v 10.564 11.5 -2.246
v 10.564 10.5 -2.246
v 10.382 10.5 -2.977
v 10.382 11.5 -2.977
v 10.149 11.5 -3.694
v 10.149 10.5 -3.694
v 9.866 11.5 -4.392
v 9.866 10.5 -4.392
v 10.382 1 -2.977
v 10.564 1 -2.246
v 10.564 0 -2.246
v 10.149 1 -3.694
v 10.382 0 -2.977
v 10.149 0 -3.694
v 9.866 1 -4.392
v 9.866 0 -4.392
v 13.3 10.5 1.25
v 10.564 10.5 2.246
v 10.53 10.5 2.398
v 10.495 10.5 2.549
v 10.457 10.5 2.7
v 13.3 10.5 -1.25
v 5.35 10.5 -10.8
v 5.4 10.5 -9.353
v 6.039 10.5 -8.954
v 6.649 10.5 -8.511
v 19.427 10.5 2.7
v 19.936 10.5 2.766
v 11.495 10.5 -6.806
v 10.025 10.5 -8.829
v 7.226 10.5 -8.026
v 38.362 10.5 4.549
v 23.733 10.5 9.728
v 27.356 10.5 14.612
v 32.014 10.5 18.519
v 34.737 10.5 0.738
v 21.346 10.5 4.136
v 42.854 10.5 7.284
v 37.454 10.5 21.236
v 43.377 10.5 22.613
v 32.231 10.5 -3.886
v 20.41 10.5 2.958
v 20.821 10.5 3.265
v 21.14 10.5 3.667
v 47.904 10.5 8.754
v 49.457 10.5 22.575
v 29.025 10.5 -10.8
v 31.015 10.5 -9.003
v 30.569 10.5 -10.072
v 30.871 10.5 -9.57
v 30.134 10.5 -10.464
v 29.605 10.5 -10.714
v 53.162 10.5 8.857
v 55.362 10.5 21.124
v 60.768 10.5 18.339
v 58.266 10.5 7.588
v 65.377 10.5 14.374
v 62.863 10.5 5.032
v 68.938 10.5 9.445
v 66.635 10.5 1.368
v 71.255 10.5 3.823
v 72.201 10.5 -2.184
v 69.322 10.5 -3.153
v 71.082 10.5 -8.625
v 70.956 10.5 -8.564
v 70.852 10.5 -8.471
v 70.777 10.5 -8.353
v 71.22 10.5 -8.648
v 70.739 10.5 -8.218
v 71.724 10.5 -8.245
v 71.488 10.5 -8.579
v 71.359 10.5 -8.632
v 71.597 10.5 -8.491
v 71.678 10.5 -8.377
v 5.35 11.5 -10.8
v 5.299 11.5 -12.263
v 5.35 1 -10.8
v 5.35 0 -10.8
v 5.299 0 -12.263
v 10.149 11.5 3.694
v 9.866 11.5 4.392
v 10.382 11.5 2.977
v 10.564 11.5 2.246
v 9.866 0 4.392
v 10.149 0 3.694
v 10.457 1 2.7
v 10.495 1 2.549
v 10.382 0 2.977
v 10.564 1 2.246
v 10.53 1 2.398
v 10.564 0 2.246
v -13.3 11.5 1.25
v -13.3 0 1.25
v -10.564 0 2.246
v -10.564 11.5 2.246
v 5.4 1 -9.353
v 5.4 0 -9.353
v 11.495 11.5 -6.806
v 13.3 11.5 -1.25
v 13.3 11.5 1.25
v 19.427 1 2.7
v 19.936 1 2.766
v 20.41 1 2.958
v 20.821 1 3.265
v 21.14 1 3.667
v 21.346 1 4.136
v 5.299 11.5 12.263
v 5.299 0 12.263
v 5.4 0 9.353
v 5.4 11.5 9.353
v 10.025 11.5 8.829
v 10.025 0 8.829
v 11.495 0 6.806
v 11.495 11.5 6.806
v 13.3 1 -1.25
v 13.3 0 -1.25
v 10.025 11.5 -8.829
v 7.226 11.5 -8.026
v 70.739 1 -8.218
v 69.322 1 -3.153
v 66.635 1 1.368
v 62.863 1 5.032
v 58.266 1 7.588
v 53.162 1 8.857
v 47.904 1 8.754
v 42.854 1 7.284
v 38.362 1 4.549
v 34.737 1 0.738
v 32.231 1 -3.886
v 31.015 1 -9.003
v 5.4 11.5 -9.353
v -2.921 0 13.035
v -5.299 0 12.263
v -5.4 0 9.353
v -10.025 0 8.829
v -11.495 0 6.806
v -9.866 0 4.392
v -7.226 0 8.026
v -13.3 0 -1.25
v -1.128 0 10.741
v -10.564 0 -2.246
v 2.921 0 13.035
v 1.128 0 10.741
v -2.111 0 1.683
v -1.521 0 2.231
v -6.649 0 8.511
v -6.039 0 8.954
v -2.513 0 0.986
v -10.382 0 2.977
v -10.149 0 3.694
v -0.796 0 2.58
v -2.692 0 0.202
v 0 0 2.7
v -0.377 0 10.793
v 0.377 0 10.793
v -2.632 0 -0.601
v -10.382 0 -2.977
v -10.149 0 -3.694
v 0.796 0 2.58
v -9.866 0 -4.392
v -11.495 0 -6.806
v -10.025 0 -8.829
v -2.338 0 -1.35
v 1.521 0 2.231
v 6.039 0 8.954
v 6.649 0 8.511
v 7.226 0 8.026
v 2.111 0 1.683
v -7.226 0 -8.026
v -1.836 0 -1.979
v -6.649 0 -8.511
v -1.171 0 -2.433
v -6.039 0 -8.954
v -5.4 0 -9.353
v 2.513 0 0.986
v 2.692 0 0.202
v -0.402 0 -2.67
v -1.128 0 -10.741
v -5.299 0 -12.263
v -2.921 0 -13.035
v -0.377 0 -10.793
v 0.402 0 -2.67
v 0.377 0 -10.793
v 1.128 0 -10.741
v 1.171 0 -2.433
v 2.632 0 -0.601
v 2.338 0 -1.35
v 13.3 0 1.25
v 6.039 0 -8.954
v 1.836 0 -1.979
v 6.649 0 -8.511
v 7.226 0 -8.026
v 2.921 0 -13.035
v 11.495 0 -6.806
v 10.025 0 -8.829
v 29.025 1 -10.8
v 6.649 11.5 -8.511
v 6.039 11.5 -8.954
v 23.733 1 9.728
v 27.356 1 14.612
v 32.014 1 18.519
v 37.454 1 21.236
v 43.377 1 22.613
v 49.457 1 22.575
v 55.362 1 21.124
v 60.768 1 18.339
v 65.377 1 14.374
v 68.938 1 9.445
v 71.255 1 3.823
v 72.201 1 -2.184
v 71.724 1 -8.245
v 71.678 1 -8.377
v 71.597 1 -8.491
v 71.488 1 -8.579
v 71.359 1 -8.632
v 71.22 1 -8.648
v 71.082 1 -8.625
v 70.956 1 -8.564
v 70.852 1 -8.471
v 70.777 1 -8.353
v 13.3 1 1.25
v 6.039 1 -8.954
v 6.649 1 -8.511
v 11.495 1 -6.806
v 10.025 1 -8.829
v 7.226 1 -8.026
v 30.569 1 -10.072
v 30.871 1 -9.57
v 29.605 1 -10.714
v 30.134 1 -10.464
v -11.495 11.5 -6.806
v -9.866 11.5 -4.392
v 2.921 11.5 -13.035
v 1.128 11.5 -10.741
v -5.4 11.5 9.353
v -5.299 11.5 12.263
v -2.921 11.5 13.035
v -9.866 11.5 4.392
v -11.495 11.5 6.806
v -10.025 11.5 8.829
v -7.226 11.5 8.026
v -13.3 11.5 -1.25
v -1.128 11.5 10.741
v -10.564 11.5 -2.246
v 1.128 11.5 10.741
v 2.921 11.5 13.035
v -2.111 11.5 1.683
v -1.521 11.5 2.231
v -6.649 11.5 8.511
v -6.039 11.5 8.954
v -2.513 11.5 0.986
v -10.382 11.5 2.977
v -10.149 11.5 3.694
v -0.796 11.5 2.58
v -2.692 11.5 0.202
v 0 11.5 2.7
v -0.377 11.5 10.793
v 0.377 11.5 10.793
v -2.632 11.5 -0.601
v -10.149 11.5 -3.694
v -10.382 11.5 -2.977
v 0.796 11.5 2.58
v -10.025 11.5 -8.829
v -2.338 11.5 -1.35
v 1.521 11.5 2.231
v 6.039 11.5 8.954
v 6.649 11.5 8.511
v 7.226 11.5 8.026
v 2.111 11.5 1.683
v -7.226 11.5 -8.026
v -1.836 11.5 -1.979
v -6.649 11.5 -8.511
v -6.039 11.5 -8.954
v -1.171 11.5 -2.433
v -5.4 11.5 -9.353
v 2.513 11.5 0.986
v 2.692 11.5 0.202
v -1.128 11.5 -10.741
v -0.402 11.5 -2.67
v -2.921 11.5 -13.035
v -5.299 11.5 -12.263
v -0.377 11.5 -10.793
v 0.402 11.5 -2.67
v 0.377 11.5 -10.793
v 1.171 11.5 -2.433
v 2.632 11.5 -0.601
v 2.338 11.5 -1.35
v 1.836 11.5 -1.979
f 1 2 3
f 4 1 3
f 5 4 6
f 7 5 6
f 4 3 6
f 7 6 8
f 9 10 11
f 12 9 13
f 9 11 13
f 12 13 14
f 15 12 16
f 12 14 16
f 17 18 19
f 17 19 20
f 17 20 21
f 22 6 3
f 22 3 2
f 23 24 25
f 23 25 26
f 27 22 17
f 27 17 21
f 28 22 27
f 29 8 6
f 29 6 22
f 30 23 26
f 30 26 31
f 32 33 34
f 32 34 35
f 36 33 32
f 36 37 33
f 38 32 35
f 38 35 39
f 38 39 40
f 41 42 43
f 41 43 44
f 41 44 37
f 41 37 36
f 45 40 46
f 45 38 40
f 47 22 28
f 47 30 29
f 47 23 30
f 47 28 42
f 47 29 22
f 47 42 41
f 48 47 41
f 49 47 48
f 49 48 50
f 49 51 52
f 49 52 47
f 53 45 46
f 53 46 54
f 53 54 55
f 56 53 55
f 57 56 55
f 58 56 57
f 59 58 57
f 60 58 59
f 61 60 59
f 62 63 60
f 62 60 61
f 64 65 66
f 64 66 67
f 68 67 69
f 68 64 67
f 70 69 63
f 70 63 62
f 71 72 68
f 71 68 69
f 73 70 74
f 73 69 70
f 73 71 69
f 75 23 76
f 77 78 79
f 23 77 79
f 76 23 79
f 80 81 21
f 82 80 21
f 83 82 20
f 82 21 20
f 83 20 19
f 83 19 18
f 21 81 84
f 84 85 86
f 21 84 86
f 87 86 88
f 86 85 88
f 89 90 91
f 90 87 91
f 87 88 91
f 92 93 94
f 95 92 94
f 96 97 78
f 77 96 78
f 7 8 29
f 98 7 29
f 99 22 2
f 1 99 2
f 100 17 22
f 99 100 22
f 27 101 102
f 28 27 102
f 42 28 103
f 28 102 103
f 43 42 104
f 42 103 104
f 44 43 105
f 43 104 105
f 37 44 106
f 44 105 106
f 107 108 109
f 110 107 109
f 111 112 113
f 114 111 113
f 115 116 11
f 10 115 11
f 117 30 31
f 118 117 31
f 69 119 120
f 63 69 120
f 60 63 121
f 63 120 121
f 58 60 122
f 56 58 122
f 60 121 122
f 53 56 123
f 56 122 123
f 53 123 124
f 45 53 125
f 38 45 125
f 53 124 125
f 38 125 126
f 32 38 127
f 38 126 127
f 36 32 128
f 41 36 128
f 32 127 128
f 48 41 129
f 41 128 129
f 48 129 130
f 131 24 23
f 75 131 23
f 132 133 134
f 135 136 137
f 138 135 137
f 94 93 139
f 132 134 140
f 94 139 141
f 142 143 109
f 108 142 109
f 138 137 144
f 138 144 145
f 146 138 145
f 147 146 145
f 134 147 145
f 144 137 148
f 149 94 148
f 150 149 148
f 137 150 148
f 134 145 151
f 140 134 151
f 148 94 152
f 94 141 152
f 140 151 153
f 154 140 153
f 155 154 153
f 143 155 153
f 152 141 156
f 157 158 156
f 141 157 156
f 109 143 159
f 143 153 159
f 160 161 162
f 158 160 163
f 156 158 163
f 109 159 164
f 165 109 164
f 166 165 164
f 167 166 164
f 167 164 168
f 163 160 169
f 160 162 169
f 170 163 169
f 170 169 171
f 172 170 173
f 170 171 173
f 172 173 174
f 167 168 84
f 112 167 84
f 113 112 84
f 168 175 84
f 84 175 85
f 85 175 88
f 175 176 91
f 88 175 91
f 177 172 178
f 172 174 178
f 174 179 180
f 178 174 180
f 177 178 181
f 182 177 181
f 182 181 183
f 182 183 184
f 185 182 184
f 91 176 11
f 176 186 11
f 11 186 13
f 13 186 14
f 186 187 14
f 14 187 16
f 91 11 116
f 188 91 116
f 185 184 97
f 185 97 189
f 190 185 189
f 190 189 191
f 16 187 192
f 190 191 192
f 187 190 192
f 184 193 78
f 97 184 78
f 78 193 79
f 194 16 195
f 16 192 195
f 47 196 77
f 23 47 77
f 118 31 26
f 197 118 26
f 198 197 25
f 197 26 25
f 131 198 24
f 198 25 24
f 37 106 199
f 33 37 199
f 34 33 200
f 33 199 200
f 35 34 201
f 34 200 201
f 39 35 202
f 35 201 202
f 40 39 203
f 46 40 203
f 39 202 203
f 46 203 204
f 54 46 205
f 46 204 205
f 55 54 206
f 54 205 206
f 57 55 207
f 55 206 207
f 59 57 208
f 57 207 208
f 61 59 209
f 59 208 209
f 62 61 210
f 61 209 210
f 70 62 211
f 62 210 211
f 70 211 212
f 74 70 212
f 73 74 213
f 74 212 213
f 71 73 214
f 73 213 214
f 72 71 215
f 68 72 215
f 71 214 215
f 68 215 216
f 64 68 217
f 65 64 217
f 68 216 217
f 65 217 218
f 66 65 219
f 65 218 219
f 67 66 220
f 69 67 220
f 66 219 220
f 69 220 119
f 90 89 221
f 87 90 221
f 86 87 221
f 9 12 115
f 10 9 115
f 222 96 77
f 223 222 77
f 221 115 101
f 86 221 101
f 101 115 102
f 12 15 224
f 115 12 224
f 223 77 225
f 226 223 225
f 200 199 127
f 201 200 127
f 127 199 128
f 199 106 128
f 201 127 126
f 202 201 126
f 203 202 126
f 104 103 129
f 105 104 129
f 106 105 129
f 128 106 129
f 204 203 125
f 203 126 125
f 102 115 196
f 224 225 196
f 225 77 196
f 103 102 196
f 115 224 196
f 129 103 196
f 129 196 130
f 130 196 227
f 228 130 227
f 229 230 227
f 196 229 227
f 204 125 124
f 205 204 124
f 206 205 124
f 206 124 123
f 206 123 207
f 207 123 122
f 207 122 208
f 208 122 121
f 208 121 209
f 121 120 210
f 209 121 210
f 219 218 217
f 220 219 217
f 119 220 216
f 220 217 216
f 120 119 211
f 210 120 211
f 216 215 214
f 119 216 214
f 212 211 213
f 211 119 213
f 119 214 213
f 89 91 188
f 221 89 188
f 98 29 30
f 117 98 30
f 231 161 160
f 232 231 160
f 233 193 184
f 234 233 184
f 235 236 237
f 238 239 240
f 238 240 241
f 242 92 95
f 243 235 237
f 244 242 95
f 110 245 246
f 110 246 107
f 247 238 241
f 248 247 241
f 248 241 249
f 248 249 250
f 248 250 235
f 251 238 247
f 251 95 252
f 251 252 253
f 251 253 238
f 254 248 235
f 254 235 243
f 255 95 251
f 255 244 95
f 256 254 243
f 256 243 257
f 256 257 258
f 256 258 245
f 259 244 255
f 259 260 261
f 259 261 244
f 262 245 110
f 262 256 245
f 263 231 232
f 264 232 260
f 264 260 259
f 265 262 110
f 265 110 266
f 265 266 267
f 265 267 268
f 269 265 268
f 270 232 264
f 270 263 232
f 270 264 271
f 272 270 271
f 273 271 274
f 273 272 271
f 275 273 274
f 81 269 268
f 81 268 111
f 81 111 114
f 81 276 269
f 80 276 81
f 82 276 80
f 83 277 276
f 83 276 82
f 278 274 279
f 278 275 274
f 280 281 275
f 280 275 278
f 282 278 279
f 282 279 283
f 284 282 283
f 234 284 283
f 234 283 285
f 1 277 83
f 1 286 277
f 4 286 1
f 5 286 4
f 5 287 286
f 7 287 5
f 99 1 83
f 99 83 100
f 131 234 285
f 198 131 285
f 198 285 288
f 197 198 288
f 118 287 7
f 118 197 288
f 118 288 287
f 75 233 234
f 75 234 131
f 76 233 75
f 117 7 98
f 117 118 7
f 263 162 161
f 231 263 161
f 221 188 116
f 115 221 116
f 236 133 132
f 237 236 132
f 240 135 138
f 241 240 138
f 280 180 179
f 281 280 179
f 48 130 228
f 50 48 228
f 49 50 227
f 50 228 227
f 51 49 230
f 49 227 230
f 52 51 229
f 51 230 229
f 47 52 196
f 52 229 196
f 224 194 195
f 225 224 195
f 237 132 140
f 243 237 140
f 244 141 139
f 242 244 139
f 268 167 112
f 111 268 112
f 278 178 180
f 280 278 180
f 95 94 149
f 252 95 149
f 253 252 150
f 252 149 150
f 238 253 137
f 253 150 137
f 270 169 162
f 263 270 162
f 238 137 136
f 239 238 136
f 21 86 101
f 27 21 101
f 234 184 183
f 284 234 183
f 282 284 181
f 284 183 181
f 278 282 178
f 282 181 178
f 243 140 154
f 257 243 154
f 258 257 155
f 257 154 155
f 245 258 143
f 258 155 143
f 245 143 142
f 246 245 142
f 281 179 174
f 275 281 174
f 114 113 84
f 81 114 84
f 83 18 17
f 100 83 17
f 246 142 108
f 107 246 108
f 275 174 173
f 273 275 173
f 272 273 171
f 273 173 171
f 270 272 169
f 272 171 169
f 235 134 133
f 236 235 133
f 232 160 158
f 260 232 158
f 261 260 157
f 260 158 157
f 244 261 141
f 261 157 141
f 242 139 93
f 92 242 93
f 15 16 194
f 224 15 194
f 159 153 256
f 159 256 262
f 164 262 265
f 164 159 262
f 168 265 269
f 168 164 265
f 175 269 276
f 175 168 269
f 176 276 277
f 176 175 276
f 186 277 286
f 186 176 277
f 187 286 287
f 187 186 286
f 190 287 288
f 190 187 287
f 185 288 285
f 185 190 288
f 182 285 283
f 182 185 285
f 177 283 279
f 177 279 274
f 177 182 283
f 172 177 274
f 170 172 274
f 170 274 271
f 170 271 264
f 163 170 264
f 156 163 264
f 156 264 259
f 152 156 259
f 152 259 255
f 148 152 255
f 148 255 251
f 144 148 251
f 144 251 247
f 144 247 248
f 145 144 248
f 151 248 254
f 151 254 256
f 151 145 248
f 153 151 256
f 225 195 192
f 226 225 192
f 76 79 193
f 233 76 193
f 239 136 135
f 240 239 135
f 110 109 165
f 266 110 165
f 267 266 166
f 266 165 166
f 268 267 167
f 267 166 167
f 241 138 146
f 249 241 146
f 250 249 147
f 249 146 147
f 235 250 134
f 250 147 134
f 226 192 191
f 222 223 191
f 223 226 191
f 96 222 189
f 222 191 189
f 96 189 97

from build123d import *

# Parameters (mm, degrees)
CROQUIS1_R              = 10.8
CROQUIS1_R_2            = 2.7
SALIENTE_EXTRUIR1_DEPTH = 11.5
BOSS_EXTRUDE1_START     = 1
BOSS_EXTRUDE1_DEPTH     = 9.5


with BuildPart() as part:
    # Croquis1 → Saliente-Extruir1 (new body)
    with BuildSketch(Plane(origin=(0, 0, 0), x_dir=(1, 0, 0), z_dir=(0, 1, 0))):
        Circle(CROQUIS1_R)
        with Locations(Location((0, 0, 0), (0, 0, 270))):
            Circle(CROQUIS1_R_2, mode=Mode.SUBTRACT)
        with BuildLine():
            Line((13.3, 1.25), (10.563906891, 2.24585645))
            ThreePointArc((10.563906891, 2.24585645), (10.740814551, 1.129115932), (10.8, 0))
            ThreePointArc((10.8, 0), (10.740814551, -1.129115932), (10.563906891, -2.24585645))
            Line((10.563906891, -2.24585645), (13.3, -1.25))
            Line((13.3, -1.25), (13.3, 1.25))
        make_face()
        with BuildLine():
            Line((10.02519446, 8.828815098), (7.226298902, 8.026244712))
            ThreePointArc((7.226298902, 8.026244712), (8.737383539, 6.348080725), (9.866461502, 4.392372642))
            Line((9.866461502, 4.392372642), (11.494657591, 6.806272613))
            Line((11.494657591, 6.806272613), (10.02519446, 8.828815098))
        make_face()
        with BuildLine():
            Line((5.349828089, 10.8), (5.298746671, 12.262780424))
            Line((5.298746671, 12.262780424), (2.92110538, 13.03532291))
            Line((2.92110538, 13.03532291), (1.128490345, 10.740880296))
            ThreePointArc((1.128490345, 10.740880296), (3.337383539, 10.271410376), (5.400363168, 9.352864677))
            Line((5.400363168, 9.352864677), (5.349828089, 10.8))
        make_face()
        with BuildLine():
            ThreePointArc((-5.400363168, 9.352864677), (-3.337383539, 10.271410376), (-1.128490345, 10.740880296))
            Line((-1.128490345, 10.740880296), (-2.92110538, 13.03532291))
            Line((-2.92110538, 13.03532291), (-5.298746671, 12.262780424))
            Line((-5.298746671, 12.262780424), (-5.400363168, 9.352864677))
        make_face()
        with BuildLine():
            ThreePointArc((-9.866461502, 4.392372642), (-8.737383539, 6.348080725), (-7.226298902, 8.026244712))
            Line((-7.226298902, 8.026244712), (-10.02519446, 8.828815098))
            Line((-10.02519446, 8.828815098), (-11.494657591, 6.806272613))
            Line((-11.494657591, 6.806272613), (-9.866461502, 4.392372642))
        make_face()
        with BuildLine():
            ThreePointArc((-10.563906891, -2.24585645), (-10.8, 0), (-10.563906891, 2.24585645))
            Line((-10.563906891, 2.24585645), (-13.3, 1.25))
            Line((-13.3, 1.25), (-13.3, -1.25))
            Line((-13.3, -1.25), (-10.563906891, -2.24585645))
        make_face()
        with BuildLine():
            ThreePointArc((-7.226298902, -8.026244712), (-8.737383539, -6.348080725), (-9.866461502, -4.392372642))
            Line((-9.866461502, -4.392372642), (-11.494657591, -6.806272613))
            Line((-11.494657591, -6.806272613), (-10.02519446, -8.828815098))
            Line((-10.02519446, -8.828815098), (-7.226298902, -8.026244712))
        make_face()
        with BuildLine():
            ThreePointArc((-1.128490345, -10.740880296), (-3.337383539, -10.271410376), (-5.400363168, -9.352864677))
            Line((-5.400363168, -9.352864677), (-5.298746671, -12.262780424))
            Line((-5.298746671, -12.262780424), (-2.92110538, -13.03532291))
            Line((-2.92110538, -13.03532291), (-1.128490345, -10.740880296))
        make_face()
        with BuildLine():
            Line((5.298746671, -12.262780424), (5.400363168, -9.352864677))
            ThreePointArc((5.400363168, -9.352864677), (3.337383539, -10.271410376), (1.128490345, -10.740880296))
            Line((1.128490345, -10.740880296), (2.92110538, -13.03532291))
            Line((2.92110538, -13.03532291), (5.298746671, -12.262780424))
        make_face()
        with BuildLine():
            Line((11.494657591, -6.806272613), (9.866461502, -4.392372642))
            ThreePointArc((9.866461502, -4.392372642), (8.737383539, -6.348080725), (7.226298902, -8.026244712))
            Line((7.226298902, -8.026244712), (10.02519446, -8.828815098))
            Line((10.02519446, -8.828815098), (11.494657591, -6.806272613))
        make_face()
    extrude(amount=SALIENTE_EXTRUIR1_DEPTH)

    # Croquis1<6> → Boss-Extrude1 (add)
    with BuildSketch(Plane(origin=(0, 0, 0), x_dir=(1, 0, 0), z_dir=(0, 1, 0)).offset(BOSS_EXTRUDE1_START)):
        with BuildLine():
            Line((29.025420212, 10.8), (5.349828089, 10.8))
            Line((5.349828089, 10.8), (5.400363168, 9.352864677))
            ThreePointArc((5.400363168, 9.352864677), (6.348080725, 8.737383539), (7.226298902, 8.026244712))
            Line((7.226298902, 8.026244712), (10.02519446, 8.828815098))
            Line((10.02519446, 8.828815098), (11.494657591, 6.806272613))
            Line((11.494657591, 6.806272613), (9.866461502, 4.392372642))
            ThreePointArc((9.866461502, 4.392372642), (10.271410376, 3.337383539), (10.563906891, 2.24585645))
            Line((10.563906891, 2.24585645), (13.3, 1.25))
            Line((13.3, 1.25), (13.3, -1.25))
            Line((13.3, -1.25), (10.563906891, -2.24585645))
            ThreePointArc((10.563906891, -2.24585645), (10.512933542, -2.473505273), (10.457055035, -2.7))
            Line((10.457055035, -2.7), (19.42731544, -2.7))
            ThreePointArc((19.42731544, -2.7), (20.625475176, -3.098621454), (21.346022736, -4.135586754))
            ThreePointArc((21.346022736, -4.135586754), (52.452433734, -22.022808697), (71.724168494, 8.245355326))
            ThreePointArc((71.724168494, 8.245355326), (71.219997226, 8.647854219), (70.738687337, 8.218279059))
            ThreePointArc((70.738687337, 8.218279059), (50.52963152, -8.979070796), (31.015135616, 9.002565078))
            ThreePointArc((31.015135616, 9.002565078), (30.36610471, 10.284104133), (29.025420212, 10.8))
        make_face()
    extrude(amount=BOSS_EXTRUDE1_DEPTH)


solid = part.part
